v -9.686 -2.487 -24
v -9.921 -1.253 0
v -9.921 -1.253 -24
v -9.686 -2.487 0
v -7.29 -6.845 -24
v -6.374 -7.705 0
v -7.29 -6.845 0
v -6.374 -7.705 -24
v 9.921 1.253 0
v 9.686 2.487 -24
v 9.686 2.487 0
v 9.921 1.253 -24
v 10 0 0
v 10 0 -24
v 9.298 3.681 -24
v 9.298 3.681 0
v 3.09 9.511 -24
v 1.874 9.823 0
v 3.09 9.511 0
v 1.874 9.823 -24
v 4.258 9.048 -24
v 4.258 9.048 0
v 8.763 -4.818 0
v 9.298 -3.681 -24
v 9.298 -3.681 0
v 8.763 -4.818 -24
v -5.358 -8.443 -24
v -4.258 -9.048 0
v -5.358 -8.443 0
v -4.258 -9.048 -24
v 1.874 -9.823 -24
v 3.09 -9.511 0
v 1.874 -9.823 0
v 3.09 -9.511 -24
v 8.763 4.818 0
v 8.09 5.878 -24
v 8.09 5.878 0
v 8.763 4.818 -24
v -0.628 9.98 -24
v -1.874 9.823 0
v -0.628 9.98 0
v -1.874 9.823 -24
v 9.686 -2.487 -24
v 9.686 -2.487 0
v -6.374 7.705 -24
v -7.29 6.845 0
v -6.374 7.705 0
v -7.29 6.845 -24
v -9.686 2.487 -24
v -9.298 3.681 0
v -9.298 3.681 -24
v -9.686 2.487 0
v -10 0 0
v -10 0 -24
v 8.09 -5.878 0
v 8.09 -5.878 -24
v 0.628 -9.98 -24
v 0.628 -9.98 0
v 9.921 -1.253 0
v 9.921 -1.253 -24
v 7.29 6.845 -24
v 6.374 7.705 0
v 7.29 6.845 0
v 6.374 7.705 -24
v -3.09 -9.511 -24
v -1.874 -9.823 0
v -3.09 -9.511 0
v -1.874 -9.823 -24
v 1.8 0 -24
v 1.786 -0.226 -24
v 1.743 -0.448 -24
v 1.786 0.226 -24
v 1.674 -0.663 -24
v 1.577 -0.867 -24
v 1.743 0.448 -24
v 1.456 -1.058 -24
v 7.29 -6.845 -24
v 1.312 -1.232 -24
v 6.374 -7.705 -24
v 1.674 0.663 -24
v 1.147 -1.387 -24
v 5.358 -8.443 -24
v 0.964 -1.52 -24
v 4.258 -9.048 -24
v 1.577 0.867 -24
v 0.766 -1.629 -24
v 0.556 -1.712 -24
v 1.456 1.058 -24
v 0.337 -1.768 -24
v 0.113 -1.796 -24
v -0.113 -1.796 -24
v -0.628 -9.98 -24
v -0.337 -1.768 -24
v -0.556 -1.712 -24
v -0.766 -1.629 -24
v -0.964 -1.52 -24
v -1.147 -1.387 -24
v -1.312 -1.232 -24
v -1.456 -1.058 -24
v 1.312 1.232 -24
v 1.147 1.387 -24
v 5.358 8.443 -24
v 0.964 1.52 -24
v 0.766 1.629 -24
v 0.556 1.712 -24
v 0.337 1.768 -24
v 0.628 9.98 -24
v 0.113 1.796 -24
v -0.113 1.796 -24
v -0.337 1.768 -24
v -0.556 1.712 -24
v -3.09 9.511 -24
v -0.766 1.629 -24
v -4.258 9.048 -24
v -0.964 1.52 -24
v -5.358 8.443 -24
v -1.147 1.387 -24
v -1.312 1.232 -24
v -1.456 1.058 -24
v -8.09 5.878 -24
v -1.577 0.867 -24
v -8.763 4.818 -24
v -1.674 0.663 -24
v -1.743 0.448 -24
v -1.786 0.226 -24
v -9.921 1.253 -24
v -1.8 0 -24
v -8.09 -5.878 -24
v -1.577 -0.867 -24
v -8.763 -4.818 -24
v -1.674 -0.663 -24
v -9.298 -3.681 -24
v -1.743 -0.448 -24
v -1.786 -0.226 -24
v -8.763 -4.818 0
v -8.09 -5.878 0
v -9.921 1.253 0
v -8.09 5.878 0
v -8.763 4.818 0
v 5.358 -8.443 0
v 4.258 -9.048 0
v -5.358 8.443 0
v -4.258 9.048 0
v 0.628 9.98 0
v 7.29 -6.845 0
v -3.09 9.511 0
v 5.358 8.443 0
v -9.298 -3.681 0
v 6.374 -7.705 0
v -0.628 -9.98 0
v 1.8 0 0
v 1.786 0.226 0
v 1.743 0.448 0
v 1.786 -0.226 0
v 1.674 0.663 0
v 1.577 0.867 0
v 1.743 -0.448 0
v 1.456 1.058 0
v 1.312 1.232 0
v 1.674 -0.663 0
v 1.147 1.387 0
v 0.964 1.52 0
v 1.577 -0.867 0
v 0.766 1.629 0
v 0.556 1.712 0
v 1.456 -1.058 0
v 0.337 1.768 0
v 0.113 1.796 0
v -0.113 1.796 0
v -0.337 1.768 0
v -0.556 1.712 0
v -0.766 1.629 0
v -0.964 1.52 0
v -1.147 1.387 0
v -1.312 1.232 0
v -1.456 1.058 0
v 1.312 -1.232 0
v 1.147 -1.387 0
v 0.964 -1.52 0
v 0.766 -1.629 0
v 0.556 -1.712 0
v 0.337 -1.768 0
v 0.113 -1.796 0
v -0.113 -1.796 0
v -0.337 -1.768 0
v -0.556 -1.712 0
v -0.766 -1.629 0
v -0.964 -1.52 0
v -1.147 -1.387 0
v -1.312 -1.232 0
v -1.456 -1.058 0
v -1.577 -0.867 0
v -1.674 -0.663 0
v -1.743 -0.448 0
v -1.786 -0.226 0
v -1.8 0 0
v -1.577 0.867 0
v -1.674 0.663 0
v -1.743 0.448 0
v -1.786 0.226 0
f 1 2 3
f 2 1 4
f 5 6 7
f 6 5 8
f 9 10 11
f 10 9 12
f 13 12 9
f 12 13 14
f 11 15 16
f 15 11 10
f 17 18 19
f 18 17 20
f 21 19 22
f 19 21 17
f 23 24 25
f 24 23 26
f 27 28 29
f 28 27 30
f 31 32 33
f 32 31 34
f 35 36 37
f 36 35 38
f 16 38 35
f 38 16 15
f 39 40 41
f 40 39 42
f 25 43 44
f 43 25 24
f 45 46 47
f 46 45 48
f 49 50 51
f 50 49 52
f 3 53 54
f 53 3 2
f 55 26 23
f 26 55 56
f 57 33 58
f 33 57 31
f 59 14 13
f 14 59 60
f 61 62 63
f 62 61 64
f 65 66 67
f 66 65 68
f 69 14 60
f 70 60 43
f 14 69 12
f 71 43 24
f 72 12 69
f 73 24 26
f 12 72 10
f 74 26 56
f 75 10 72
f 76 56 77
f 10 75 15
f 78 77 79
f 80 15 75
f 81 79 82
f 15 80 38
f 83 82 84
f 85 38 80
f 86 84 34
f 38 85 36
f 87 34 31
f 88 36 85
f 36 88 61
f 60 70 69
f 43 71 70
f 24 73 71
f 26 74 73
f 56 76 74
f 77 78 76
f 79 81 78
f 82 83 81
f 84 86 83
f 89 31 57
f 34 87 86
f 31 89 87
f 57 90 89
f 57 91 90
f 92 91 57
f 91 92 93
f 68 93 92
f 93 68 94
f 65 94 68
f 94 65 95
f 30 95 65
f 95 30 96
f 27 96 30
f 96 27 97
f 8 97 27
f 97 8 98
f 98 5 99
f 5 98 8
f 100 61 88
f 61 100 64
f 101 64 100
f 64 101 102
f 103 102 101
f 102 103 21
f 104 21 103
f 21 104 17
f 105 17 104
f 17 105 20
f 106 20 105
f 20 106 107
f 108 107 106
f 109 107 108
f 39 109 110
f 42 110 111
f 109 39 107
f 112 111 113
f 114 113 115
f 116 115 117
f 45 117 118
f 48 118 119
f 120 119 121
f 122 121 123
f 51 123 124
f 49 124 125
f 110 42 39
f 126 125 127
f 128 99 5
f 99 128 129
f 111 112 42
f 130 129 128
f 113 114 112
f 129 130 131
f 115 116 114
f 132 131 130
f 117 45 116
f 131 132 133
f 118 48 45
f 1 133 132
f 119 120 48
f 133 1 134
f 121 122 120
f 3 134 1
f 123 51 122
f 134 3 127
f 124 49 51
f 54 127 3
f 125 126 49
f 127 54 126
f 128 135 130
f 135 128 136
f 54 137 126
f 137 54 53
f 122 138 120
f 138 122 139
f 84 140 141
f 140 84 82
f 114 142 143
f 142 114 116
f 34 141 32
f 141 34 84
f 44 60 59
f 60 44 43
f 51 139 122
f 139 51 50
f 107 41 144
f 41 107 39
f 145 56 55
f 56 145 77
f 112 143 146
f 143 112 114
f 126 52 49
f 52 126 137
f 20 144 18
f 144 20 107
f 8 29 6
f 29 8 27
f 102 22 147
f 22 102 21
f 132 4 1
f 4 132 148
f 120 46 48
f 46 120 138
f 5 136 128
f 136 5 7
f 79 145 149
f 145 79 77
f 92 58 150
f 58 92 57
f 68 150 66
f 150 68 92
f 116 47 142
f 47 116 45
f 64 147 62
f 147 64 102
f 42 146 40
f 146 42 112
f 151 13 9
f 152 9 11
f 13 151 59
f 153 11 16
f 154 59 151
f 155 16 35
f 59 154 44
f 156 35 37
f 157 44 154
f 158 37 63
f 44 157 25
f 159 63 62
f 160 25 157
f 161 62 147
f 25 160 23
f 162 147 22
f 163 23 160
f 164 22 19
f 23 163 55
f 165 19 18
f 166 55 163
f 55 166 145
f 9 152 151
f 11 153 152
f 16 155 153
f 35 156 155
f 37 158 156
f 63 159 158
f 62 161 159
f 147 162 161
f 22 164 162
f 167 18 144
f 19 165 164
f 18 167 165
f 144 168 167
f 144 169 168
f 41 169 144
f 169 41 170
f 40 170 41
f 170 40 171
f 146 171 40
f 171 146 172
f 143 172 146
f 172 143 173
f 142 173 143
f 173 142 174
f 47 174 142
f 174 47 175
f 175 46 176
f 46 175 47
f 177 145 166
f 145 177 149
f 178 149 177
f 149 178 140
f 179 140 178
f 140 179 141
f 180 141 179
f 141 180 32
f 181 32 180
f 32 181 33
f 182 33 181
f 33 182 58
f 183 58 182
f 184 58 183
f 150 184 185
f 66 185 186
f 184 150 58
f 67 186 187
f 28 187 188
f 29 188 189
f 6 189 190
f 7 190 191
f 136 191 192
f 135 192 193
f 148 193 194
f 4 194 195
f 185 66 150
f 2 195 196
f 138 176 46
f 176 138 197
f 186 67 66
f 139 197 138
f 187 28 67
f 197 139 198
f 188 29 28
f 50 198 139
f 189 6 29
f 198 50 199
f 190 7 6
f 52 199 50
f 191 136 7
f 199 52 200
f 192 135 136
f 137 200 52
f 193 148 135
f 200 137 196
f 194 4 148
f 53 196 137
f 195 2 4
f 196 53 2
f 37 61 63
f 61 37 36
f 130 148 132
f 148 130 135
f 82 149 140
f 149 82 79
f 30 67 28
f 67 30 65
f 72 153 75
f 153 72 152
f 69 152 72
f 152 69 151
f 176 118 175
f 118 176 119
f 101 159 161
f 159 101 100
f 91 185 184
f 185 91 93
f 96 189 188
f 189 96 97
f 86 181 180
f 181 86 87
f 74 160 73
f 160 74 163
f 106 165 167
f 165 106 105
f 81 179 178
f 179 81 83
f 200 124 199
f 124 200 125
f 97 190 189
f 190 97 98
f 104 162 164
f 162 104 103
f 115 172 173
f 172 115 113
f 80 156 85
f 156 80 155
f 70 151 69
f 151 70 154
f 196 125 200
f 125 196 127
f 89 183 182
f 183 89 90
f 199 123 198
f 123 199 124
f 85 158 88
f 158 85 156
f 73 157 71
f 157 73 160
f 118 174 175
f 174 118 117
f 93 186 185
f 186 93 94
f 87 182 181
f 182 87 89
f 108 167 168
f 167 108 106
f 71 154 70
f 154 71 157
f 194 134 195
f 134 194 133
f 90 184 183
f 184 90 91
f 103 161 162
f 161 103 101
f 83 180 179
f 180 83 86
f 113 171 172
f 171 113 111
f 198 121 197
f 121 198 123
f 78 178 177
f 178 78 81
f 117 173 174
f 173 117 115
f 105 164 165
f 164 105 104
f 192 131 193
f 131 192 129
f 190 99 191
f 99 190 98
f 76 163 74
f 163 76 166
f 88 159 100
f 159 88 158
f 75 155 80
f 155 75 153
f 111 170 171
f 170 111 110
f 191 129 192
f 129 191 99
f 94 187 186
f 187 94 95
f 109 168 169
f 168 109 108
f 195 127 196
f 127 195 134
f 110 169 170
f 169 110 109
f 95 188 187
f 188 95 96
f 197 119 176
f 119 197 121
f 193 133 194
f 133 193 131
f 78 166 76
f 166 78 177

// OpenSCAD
$fn = 50;


difference() {
	union() {
		translate(v = [0, 0, -24.0000000000]) {
			cylinder(h = 24, r = 10.0000000000);
		}
		cylinder(h = 0, r = 16.0000000000);
	}
	union() {
		#translate(v = [0, 0, -24]) {
			cylinder(h = 24, r = 1.8000000000);
		}
	}
}
